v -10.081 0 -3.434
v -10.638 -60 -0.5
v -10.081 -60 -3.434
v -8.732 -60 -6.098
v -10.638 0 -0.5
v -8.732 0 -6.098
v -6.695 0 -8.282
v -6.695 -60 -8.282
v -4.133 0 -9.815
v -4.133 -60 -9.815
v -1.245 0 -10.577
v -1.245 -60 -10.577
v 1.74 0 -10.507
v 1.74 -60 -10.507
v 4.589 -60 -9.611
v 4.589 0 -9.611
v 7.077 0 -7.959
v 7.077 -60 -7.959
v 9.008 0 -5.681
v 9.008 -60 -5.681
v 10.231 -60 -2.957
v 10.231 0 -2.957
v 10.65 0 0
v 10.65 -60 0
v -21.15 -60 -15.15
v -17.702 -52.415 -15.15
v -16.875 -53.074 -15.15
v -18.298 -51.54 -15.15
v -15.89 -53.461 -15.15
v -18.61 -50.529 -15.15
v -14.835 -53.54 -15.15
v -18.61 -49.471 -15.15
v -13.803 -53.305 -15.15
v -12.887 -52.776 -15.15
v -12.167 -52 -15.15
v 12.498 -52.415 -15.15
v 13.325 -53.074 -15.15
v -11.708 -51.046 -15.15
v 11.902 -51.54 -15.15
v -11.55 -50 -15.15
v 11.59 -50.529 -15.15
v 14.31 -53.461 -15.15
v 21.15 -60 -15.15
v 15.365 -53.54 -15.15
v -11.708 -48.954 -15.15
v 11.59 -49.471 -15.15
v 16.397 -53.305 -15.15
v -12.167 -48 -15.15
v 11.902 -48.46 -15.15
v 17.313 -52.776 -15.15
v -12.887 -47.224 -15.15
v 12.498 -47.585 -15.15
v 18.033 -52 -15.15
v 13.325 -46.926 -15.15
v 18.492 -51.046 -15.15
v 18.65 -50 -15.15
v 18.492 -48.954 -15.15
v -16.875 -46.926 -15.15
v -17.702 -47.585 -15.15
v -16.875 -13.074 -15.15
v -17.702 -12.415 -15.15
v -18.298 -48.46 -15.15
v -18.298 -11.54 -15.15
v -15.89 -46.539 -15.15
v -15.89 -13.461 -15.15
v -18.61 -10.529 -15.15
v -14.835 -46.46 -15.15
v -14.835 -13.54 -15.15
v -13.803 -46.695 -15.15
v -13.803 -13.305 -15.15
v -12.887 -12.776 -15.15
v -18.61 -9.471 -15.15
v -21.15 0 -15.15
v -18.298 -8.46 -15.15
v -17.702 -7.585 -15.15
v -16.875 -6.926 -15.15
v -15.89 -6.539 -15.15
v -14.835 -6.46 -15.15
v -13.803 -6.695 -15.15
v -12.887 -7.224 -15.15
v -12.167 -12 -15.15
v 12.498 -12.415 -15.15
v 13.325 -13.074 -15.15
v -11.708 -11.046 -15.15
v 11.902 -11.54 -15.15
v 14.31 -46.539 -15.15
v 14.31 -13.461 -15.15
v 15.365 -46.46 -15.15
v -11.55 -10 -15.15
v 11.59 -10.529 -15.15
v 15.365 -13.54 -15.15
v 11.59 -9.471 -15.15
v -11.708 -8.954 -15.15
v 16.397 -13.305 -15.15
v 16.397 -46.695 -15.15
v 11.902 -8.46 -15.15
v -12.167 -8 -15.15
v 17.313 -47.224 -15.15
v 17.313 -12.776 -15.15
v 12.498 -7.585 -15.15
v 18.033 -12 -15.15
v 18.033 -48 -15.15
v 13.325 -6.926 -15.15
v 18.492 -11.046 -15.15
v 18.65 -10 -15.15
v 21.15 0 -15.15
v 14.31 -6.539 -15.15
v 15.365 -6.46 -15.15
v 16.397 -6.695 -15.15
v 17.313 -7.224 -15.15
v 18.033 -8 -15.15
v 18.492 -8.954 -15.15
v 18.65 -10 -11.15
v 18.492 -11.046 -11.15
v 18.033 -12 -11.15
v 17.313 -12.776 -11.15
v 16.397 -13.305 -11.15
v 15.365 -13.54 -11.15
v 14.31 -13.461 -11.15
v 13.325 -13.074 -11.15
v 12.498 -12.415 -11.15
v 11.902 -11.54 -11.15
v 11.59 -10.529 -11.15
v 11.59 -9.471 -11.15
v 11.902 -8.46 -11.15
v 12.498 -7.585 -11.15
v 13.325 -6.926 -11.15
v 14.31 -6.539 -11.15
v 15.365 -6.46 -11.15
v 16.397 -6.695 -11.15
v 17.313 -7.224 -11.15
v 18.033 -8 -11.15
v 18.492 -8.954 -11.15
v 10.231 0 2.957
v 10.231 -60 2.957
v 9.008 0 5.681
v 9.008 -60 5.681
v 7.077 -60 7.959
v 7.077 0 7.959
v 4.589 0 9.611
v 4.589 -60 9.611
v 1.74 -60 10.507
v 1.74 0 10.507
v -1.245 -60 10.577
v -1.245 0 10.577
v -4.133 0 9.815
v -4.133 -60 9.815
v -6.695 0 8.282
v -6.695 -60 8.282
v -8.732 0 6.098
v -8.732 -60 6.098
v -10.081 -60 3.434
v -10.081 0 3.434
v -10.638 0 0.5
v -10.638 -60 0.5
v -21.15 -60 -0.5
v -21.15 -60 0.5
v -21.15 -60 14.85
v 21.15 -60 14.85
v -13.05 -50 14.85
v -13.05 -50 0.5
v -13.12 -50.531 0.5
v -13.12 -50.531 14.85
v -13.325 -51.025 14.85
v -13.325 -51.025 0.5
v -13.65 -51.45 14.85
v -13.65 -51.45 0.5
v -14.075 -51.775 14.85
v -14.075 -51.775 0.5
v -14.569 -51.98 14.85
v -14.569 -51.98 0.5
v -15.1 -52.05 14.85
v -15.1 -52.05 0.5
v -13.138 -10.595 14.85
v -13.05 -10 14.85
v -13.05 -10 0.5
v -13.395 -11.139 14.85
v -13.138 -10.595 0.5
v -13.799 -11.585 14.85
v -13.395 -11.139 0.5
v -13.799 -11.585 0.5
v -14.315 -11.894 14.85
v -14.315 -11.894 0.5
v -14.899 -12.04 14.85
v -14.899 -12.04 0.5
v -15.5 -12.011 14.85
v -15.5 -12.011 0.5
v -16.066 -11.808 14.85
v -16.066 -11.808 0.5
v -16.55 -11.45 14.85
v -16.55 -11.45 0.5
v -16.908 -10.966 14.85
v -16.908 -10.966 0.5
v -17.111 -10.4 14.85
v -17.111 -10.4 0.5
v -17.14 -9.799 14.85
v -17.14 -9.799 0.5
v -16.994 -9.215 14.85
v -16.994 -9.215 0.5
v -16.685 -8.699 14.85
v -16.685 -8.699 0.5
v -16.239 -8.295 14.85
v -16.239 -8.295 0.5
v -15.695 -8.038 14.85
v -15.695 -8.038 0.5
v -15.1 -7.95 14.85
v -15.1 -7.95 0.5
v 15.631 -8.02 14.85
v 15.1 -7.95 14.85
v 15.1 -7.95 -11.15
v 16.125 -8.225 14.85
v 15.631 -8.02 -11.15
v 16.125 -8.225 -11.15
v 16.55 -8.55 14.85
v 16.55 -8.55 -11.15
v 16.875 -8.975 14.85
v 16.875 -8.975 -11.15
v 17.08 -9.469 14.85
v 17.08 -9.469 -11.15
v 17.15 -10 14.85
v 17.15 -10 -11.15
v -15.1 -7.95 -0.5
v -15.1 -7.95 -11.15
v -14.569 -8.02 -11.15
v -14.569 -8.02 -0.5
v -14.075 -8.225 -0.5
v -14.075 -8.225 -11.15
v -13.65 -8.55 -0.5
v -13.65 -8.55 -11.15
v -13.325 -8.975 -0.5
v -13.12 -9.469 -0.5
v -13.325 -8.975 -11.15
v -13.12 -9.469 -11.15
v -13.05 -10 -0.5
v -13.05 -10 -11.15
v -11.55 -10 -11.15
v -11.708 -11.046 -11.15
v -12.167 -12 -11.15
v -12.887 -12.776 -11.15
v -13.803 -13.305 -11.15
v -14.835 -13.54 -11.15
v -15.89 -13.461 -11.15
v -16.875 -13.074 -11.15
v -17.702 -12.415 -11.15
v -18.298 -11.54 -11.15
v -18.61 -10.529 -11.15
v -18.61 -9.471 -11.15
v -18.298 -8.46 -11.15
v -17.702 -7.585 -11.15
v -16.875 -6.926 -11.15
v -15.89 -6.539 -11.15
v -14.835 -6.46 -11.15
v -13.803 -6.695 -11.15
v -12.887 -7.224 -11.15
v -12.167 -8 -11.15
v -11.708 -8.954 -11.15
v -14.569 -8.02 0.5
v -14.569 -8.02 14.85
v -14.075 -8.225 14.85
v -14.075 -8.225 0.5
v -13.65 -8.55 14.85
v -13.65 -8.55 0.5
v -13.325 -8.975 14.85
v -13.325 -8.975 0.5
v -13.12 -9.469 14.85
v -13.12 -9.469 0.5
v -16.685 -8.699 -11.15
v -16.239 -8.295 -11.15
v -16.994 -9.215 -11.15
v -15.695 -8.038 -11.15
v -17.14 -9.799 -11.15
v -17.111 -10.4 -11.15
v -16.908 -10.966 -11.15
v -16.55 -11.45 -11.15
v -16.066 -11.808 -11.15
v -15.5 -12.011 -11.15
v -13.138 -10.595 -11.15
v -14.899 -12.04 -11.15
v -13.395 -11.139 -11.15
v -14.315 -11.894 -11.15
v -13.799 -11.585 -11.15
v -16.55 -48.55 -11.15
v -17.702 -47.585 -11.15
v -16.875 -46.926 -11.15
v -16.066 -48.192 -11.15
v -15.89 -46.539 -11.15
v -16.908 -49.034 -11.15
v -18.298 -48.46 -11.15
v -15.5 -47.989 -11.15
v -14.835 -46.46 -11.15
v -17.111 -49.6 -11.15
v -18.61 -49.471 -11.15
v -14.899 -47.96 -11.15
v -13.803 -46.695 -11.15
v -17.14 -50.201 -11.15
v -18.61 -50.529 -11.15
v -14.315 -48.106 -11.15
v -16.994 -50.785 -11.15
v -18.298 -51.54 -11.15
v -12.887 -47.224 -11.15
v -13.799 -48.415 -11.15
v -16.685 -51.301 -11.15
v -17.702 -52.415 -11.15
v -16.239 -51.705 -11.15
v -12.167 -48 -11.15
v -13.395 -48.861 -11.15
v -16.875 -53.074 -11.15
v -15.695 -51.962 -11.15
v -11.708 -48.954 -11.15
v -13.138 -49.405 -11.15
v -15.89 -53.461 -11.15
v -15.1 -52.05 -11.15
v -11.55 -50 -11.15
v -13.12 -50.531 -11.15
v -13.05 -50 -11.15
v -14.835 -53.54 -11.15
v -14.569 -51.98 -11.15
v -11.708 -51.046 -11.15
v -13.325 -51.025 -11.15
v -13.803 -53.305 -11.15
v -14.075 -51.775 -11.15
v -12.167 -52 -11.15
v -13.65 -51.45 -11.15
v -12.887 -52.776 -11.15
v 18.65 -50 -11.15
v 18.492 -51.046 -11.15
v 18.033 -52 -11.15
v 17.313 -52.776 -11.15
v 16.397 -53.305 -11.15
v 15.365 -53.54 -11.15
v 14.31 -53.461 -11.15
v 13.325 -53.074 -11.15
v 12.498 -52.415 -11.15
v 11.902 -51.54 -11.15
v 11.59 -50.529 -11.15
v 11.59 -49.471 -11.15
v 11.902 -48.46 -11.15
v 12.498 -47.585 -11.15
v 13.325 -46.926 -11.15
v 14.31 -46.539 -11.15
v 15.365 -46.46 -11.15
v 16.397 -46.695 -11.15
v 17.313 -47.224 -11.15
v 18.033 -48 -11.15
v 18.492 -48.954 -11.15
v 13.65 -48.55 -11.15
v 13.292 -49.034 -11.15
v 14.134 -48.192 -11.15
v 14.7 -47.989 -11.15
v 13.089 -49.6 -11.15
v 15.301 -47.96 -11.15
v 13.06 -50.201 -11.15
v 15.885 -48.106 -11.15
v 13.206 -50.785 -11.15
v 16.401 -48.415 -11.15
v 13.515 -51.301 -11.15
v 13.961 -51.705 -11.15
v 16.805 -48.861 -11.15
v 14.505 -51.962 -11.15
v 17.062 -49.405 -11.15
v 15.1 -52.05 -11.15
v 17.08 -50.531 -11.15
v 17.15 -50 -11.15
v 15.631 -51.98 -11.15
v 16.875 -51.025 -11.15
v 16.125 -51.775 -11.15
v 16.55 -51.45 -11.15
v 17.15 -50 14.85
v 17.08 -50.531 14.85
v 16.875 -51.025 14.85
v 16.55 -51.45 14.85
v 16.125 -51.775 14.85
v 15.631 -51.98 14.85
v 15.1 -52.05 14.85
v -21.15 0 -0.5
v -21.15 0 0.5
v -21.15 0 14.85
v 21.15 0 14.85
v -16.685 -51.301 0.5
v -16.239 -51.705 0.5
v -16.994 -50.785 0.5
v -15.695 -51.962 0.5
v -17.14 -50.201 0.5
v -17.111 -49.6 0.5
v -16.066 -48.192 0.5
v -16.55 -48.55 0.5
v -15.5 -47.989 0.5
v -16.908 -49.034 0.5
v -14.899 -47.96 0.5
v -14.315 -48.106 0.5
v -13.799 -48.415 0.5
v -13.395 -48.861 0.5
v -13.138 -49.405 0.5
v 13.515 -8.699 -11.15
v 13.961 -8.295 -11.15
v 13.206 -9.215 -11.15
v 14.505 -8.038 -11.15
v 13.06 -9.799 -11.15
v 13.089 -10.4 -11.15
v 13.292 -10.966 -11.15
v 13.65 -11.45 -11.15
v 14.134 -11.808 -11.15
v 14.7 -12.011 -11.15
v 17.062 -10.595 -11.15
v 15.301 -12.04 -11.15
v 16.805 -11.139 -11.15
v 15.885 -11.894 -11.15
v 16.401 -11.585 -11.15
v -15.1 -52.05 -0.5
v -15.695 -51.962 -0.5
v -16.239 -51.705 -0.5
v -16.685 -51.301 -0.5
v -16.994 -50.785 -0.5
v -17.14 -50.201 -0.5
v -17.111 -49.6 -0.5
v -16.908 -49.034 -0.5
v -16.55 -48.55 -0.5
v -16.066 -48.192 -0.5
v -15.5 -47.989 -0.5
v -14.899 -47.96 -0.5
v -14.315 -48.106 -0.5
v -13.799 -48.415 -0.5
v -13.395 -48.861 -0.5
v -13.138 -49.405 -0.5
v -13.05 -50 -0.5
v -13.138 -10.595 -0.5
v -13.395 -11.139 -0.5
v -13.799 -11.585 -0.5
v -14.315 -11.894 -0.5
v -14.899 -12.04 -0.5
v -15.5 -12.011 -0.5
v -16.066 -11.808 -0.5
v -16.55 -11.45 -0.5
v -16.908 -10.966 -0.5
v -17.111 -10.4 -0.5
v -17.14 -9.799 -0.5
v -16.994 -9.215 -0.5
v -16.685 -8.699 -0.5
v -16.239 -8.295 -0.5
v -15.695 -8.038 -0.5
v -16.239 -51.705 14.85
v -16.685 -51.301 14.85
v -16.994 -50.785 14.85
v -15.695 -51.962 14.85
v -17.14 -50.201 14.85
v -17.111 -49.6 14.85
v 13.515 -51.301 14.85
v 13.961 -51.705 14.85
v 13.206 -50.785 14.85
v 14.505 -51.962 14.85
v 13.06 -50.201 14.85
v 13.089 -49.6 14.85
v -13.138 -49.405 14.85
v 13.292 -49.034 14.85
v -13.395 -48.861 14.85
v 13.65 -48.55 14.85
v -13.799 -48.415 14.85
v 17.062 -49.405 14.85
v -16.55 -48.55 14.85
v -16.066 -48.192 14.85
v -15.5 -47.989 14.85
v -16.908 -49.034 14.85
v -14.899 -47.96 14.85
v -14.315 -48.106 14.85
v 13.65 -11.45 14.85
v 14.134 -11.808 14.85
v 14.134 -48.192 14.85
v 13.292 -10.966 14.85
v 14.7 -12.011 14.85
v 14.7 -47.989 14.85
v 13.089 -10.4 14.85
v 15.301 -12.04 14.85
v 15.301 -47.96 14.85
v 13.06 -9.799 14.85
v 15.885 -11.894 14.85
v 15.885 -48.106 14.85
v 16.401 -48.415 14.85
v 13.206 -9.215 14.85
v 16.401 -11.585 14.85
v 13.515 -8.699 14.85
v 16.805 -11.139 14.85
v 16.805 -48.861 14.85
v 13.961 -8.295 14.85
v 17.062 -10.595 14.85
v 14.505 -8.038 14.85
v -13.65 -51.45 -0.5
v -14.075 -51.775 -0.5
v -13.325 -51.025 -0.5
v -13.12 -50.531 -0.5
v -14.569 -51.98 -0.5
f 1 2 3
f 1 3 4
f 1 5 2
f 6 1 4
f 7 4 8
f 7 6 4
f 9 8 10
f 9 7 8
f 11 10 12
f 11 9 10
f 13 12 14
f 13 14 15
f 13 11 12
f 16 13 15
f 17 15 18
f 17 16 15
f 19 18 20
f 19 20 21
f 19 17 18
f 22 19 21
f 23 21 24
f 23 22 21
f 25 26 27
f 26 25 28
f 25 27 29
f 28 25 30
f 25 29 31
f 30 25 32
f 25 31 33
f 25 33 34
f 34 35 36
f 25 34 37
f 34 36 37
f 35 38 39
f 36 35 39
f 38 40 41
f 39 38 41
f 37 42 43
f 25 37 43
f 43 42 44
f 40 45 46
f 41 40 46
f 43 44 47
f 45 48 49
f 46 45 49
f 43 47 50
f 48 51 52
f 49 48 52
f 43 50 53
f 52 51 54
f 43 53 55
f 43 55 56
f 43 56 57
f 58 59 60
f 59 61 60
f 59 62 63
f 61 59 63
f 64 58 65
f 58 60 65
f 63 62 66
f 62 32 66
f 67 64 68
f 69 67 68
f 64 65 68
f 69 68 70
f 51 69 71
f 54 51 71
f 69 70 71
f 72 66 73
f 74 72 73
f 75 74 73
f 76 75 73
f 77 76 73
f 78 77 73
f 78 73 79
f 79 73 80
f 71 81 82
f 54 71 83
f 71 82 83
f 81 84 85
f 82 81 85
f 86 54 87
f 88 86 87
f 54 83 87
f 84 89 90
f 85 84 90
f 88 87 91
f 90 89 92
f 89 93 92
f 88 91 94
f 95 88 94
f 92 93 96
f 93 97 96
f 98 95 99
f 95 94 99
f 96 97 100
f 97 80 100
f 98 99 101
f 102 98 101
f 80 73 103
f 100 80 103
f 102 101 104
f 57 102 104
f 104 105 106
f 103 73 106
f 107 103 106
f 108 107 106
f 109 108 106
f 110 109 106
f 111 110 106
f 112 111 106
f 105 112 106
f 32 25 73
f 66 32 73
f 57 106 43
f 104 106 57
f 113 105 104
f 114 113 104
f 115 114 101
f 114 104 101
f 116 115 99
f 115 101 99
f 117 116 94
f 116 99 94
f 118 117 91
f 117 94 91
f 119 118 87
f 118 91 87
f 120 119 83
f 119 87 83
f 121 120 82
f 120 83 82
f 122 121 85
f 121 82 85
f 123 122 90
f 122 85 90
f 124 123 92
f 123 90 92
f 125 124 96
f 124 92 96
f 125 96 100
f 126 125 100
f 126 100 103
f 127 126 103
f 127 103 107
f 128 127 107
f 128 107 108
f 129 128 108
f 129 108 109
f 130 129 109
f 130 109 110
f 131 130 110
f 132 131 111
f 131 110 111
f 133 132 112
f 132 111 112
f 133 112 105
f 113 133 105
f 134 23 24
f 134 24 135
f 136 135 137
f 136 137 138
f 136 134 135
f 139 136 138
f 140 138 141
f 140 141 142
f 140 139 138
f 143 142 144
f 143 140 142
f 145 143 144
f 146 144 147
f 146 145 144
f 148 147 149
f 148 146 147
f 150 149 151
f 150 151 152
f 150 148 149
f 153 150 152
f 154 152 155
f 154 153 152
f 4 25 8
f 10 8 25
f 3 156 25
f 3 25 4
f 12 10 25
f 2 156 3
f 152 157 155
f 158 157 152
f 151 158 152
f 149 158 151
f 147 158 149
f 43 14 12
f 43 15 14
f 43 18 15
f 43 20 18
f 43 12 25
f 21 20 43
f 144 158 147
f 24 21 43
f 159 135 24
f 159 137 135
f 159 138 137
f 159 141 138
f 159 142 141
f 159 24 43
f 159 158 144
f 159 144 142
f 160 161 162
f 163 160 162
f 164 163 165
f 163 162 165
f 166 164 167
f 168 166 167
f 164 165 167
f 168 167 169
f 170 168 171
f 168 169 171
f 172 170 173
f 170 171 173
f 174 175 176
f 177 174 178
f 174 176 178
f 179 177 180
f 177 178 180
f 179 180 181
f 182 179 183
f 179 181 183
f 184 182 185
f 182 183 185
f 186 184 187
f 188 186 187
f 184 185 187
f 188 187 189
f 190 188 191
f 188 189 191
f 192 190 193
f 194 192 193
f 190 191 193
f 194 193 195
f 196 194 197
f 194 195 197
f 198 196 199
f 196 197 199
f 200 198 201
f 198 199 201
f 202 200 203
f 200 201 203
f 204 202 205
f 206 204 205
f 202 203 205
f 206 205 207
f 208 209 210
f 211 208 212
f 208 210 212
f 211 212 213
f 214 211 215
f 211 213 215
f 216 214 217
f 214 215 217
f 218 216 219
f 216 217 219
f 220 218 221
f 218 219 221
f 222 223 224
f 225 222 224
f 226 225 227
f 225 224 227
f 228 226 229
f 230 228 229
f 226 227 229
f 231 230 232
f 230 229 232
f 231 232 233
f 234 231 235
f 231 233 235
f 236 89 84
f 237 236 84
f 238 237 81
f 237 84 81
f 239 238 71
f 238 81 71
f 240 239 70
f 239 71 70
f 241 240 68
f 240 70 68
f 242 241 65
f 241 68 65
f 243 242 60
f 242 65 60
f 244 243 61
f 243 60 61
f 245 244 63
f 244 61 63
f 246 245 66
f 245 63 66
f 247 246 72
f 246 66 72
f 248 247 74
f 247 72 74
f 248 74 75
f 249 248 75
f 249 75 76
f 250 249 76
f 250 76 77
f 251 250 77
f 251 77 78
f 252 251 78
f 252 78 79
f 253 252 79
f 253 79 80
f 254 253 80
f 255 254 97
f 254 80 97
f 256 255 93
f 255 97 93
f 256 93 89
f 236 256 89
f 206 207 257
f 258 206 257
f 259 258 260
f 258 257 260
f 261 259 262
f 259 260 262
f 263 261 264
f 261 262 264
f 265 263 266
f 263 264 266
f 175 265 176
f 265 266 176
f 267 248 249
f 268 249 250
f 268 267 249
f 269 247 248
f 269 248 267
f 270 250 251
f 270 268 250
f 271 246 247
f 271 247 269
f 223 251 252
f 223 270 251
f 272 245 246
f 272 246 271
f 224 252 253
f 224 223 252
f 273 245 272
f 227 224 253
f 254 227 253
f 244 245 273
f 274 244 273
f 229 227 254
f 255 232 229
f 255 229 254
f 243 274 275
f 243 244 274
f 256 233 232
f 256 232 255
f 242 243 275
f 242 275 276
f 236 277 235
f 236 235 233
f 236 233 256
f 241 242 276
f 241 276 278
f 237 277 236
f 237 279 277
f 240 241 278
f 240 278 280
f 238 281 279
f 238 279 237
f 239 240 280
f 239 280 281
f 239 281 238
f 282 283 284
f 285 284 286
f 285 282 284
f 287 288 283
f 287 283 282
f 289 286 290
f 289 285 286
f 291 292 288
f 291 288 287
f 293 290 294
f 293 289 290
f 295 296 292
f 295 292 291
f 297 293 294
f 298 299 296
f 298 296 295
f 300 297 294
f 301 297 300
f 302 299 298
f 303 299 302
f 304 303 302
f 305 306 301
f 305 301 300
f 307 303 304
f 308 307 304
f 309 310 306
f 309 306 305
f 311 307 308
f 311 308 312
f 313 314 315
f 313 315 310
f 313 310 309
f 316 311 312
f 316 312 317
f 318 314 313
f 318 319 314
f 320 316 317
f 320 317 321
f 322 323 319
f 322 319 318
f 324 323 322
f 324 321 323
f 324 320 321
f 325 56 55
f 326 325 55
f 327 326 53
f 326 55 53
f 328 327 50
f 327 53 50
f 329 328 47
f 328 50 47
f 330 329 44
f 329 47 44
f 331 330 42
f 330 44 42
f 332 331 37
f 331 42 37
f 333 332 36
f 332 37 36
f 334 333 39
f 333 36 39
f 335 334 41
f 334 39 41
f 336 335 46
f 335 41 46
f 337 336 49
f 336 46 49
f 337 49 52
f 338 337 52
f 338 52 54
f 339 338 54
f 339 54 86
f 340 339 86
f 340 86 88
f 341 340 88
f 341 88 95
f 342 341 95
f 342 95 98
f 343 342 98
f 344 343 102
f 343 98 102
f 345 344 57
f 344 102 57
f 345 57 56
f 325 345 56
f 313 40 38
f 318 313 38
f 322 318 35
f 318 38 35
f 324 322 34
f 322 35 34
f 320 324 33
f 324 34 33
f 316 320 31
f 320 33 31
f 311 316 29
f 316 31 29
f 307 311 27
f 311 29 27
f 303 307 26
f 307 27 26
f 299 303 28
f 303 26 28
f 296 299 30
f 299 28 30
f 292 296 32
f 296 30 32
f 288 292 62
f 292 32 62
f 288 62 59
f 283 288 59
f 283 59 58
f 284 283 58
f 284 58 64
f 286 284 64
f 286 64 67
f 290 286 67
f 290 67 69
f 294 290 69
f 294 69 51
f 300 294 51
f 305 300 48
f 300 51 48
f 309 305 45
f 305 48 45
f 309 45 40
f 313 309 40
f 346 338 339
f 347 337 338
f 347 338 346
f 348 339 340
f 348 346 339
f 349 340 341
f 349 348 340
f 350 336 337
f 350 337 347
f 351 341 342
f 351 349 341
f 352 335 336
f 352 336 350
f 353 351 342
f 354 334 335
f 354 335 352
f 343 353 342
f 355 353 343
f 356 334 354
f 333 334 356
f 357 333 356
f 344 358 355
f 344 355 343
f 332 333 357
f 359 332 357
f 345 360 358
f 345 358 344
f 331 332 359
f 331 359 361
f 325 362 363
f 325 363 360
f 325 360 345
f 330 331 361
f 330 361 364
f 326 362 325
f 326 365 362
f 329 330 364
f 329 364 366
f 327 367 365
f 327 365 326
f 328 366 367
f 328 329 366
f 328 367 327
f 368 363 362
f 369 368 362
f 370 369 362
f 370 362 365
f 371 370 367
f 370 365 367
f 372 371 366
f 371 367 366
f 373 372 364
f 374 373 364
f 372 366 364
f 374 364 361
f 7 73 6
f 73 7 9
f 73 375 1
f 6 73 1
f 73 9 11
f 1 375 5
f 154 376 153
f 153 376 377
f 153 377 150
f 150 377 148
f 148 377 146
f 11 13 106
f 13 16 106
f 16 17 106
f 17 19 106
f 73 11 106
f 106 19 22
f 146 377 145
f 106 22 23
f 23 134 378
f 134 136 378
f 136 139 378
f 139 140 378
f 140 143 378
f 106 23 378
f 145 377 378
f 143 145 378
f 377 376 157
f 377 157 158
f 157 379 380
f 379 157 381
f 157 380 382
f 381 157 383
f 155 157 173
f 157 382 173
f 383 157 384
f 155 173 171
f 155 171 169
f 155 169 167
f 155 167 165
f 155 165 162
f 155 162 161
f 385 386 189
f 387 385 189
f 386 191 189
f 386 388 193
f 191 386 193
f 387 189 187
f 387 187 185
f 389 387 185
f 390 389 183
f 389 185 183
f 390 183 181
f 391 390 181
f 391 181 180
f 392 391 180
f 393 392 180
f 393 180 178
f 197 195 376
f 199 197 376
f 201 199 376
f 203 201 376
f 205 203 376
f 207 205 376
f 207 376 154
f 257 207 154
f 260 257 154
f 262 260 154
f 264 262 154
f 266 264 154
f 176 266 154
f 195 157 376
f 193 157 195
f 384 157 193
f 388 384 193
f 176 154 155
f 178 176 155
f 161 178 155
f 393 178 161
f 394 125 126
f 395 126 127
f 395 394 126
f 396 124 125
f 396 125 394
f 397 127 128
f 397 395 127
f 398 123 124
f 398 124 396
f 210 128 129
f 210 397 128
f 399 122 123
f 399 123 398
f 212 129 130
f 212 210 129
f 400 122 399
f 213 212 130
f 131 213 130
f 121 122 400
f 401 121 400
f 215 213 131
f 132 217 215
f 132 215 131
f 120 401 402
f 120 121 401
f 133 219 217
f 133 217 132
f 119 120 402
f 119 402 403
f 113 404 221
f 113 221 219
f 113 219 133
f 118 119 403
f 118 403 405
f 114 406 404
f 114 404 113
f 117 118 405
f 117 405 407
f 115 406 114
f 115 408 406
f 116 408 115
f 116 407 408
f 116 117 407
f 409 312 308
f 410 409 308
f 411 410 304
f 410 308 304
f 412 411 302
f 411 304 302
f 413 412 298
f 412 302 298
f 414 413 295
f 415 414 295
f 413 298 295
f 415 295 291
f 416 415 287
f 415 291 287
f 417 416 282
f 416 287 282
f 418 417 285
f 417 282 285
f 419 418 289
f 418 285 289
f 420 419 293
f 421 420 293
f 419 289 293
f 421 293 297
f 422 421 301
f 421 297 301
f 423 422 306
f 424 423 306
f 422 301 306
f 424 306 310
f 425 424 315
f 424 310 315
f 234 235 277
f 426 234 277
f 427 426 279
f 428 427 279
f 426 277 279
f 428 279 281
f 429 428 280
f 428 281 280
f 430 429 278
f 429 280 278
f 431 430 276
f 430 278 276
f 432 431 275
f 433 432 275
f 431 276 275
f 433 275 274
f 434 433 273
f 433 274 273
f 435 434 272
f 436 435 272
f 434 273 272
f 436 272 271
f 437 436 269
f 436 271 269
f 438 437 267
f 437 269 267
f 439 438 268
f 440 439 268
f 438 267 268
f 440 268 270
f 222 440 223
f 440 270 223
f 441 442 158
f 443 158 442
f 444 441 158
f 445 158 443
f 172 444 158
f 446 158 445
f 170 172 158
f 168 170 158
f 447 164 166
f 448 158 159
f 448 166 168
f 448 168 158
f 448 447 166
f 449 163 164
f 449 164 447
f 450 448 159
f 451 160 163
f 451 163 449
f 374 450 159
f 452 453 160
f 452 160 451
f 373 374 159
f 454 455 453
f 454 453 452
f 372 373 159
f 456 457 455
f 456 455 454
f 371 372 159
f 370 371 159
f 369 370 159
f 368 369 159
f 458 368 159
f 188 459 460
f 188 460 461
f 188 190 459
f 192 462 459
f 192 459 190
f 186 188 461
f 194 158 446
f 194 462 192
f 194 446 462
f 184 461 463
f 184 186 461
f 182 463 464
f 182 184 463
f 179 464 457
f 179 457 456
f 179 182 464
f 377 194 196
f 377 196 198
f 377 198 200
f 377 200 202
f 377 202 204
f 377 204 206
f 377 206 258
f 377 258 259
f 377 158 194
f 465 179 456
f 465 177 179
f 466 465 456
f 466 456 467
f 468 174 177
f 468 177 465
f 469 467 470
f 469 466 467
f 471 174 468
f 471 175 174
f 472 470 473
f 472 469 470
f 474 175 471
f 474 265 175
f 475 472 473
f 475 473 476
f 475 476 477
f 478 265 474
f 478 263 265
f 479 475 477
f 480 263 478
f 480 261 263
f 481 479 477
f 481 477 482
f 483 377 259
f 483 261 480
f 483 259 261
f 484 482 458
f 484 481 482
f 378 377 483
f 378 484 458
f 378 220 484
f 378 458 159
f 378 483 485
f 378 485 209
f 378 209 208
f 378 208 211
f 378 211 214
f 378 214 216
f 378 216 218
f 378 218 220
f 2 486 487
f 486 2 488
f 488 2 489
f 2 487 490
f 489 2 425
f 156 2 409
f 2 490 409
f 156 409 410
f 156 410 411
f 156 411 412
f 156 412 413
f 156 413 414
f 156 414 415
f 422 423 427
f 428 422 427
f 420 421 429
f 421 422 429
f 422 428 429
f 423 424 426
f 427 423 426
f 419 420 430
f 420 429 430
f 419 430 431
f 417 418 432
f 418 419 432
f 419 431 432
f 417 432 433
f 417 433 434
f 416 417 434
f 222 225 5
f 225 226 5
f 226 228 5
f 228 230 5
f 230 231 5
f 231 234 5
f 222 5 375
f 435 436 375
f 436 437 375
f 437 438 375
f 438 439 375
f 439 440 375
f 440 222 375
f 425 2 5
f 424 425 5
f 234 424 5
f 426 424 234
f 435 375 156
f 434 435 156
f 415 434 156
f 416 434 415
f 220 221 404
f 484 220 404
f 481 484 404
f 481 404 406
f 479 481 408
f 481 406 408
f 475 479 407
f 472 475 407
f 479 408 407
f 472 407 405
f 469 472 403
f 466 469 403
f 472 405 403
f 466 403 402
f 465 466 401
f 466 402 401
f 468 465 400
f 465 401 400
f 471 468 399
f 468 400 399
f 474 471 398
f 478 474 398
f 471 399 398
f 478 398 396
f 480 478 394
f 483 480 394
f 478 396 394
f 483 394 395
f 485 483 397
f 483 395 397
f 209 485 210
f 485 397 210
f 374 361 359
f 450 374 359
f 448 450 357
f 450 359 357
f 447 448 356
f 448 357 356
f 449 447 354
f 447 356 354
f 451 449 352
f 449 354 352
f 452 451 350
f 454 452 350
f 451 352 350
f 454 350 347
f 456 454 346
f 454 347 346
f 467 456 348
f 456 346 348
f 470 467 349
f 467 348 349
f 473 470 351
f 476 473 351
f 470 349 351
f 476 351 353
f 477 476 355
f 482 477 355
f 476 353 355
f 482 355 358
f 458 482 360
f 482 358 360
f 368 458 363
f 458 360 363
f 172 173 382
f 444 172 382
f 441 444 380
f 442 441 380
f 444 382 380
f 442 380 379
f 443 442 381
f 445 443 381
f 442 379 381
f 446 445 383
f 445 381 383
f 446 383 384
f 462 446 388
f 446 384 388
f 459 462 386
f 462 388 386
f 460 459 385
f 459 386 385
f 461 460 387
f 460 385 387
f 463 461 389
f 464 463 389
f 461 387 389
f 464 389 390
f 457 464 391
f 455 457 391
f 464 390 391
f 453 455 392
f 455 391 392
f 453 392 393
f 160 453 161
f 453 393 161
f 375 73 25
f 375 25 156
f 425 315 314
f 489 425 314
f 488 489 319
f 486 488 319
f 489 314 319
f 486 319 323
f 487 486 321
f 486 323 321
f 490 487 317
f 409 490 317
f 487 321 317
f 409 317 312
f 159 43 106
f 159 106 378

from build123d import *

# Parameters (mm, degrees)
F0_W     = 42.3
F0_H     = 30
F0_R     = 10.65
F1_DEPTH = 60
F3_DEPTH = 30
F4_R     = 3.55
F5_DEPTH = 4
F7_DEPTH = 60


with BuildPart() as f1:
    # F0 (on Front) → F1 (new body)
    with BuildSketch(Plane.XZ):
        with Locations((0, -0.15)):
            Rectangle(F0_W, F0_H)
        Circle(F0_R, mode=Mode.SUBTRACT)
    extrude(amount=F1_DEPTH)

    # F2 (on face) → F3 (cut)
    with BuildSketch(Plane(origin=(0, 0, -15.15), x_dir=(1, 0, 0), z_dir=(0, 0, -1))):
        with BuildLine():
            ThreePointArc((-15.1, 52.05), (-16.549569, 48.550431), (-13.05, 50))
            ThreePointArc((-13.05, 50), (-13.650431, 51.449569), (-15.1, 52.05))
        make_face()
        with BuildLine():
            ThreePointArc((15.1, 52.05), (13.650431, 48.550431), (17.15, 50))
            ThreePointArc((17.15, 50), (16.549569, 51.449569), (15.1, 52.05))
        make_face()
        with BuildLine():
            ThreePointArc((-15.1, 7.95), (-13.650431, 8.550431), (-13.05, 10))
            ThreePointArc((-13.05, 10), (-16.549569, 11.449569), (-15.1, 7.95))
        make_face()
        with BuildLine():
            ThreePointArc((15.1, 7.95), (16.549569, 8.550431), (17.15, 10))
            ThreePointArc((17.15, 10), (13.650431, 11.449569), (15.1, 7.95))
        make_face()
    extrude(amount=-F3_DEPTH, mode=Mode.SUBTRACT)

    # F4 (on face) → F5 (cut)
    with BuildSketch(Plane(origin=(0, 0, -15.15), x_dir=(1, 0, 0), z_dir=(0, 0, -1))):
        with Locations((-15.1, 50)):
            Circle(F4_R)
        with Locations((15.1, 50)):
            Circle(F4_R)
        with Locations((-15.1, 10)):
            Circle(F4_R)
        with Locations((15.1, 10)):
            Circle(F4_R)
    extrude(amount=-F5_DEPTH, mode=Mode.SUBTRACT)

    # F6 (on face) → F7 (cut)
    with BuildSketch(Plane(origin=(0, 0, 0), x_dir=(-1, 0, 0), z_dir=(0, 1, 0))):
        with BuildLine():
            Line((21.15, -0.5), (21.15, 0))
            Line((21.15, 0), (10.65, 0))
            ThreePointArc((10.65, 0), (10.647064, -0.250069), (10.638256, -0.5))
            Line((10.638256, -0.5), (21.15, -0.5))
        make_face()
        with BuildLine():
            Line((10.65, 0), (21.15, 0))
            Line((21.15, 0), (21.15, 0.5))
            Line((21.15, 0.5), (10.638256, 0.5))
            ThreePointArc((10.638256, 0.5), (10.647064, 0.250069), (10.65, 0))
        make_face()
    extrude(amount=-F7_DEPTH, mode=Mode.SUBTRACT)


solid = f1.part
